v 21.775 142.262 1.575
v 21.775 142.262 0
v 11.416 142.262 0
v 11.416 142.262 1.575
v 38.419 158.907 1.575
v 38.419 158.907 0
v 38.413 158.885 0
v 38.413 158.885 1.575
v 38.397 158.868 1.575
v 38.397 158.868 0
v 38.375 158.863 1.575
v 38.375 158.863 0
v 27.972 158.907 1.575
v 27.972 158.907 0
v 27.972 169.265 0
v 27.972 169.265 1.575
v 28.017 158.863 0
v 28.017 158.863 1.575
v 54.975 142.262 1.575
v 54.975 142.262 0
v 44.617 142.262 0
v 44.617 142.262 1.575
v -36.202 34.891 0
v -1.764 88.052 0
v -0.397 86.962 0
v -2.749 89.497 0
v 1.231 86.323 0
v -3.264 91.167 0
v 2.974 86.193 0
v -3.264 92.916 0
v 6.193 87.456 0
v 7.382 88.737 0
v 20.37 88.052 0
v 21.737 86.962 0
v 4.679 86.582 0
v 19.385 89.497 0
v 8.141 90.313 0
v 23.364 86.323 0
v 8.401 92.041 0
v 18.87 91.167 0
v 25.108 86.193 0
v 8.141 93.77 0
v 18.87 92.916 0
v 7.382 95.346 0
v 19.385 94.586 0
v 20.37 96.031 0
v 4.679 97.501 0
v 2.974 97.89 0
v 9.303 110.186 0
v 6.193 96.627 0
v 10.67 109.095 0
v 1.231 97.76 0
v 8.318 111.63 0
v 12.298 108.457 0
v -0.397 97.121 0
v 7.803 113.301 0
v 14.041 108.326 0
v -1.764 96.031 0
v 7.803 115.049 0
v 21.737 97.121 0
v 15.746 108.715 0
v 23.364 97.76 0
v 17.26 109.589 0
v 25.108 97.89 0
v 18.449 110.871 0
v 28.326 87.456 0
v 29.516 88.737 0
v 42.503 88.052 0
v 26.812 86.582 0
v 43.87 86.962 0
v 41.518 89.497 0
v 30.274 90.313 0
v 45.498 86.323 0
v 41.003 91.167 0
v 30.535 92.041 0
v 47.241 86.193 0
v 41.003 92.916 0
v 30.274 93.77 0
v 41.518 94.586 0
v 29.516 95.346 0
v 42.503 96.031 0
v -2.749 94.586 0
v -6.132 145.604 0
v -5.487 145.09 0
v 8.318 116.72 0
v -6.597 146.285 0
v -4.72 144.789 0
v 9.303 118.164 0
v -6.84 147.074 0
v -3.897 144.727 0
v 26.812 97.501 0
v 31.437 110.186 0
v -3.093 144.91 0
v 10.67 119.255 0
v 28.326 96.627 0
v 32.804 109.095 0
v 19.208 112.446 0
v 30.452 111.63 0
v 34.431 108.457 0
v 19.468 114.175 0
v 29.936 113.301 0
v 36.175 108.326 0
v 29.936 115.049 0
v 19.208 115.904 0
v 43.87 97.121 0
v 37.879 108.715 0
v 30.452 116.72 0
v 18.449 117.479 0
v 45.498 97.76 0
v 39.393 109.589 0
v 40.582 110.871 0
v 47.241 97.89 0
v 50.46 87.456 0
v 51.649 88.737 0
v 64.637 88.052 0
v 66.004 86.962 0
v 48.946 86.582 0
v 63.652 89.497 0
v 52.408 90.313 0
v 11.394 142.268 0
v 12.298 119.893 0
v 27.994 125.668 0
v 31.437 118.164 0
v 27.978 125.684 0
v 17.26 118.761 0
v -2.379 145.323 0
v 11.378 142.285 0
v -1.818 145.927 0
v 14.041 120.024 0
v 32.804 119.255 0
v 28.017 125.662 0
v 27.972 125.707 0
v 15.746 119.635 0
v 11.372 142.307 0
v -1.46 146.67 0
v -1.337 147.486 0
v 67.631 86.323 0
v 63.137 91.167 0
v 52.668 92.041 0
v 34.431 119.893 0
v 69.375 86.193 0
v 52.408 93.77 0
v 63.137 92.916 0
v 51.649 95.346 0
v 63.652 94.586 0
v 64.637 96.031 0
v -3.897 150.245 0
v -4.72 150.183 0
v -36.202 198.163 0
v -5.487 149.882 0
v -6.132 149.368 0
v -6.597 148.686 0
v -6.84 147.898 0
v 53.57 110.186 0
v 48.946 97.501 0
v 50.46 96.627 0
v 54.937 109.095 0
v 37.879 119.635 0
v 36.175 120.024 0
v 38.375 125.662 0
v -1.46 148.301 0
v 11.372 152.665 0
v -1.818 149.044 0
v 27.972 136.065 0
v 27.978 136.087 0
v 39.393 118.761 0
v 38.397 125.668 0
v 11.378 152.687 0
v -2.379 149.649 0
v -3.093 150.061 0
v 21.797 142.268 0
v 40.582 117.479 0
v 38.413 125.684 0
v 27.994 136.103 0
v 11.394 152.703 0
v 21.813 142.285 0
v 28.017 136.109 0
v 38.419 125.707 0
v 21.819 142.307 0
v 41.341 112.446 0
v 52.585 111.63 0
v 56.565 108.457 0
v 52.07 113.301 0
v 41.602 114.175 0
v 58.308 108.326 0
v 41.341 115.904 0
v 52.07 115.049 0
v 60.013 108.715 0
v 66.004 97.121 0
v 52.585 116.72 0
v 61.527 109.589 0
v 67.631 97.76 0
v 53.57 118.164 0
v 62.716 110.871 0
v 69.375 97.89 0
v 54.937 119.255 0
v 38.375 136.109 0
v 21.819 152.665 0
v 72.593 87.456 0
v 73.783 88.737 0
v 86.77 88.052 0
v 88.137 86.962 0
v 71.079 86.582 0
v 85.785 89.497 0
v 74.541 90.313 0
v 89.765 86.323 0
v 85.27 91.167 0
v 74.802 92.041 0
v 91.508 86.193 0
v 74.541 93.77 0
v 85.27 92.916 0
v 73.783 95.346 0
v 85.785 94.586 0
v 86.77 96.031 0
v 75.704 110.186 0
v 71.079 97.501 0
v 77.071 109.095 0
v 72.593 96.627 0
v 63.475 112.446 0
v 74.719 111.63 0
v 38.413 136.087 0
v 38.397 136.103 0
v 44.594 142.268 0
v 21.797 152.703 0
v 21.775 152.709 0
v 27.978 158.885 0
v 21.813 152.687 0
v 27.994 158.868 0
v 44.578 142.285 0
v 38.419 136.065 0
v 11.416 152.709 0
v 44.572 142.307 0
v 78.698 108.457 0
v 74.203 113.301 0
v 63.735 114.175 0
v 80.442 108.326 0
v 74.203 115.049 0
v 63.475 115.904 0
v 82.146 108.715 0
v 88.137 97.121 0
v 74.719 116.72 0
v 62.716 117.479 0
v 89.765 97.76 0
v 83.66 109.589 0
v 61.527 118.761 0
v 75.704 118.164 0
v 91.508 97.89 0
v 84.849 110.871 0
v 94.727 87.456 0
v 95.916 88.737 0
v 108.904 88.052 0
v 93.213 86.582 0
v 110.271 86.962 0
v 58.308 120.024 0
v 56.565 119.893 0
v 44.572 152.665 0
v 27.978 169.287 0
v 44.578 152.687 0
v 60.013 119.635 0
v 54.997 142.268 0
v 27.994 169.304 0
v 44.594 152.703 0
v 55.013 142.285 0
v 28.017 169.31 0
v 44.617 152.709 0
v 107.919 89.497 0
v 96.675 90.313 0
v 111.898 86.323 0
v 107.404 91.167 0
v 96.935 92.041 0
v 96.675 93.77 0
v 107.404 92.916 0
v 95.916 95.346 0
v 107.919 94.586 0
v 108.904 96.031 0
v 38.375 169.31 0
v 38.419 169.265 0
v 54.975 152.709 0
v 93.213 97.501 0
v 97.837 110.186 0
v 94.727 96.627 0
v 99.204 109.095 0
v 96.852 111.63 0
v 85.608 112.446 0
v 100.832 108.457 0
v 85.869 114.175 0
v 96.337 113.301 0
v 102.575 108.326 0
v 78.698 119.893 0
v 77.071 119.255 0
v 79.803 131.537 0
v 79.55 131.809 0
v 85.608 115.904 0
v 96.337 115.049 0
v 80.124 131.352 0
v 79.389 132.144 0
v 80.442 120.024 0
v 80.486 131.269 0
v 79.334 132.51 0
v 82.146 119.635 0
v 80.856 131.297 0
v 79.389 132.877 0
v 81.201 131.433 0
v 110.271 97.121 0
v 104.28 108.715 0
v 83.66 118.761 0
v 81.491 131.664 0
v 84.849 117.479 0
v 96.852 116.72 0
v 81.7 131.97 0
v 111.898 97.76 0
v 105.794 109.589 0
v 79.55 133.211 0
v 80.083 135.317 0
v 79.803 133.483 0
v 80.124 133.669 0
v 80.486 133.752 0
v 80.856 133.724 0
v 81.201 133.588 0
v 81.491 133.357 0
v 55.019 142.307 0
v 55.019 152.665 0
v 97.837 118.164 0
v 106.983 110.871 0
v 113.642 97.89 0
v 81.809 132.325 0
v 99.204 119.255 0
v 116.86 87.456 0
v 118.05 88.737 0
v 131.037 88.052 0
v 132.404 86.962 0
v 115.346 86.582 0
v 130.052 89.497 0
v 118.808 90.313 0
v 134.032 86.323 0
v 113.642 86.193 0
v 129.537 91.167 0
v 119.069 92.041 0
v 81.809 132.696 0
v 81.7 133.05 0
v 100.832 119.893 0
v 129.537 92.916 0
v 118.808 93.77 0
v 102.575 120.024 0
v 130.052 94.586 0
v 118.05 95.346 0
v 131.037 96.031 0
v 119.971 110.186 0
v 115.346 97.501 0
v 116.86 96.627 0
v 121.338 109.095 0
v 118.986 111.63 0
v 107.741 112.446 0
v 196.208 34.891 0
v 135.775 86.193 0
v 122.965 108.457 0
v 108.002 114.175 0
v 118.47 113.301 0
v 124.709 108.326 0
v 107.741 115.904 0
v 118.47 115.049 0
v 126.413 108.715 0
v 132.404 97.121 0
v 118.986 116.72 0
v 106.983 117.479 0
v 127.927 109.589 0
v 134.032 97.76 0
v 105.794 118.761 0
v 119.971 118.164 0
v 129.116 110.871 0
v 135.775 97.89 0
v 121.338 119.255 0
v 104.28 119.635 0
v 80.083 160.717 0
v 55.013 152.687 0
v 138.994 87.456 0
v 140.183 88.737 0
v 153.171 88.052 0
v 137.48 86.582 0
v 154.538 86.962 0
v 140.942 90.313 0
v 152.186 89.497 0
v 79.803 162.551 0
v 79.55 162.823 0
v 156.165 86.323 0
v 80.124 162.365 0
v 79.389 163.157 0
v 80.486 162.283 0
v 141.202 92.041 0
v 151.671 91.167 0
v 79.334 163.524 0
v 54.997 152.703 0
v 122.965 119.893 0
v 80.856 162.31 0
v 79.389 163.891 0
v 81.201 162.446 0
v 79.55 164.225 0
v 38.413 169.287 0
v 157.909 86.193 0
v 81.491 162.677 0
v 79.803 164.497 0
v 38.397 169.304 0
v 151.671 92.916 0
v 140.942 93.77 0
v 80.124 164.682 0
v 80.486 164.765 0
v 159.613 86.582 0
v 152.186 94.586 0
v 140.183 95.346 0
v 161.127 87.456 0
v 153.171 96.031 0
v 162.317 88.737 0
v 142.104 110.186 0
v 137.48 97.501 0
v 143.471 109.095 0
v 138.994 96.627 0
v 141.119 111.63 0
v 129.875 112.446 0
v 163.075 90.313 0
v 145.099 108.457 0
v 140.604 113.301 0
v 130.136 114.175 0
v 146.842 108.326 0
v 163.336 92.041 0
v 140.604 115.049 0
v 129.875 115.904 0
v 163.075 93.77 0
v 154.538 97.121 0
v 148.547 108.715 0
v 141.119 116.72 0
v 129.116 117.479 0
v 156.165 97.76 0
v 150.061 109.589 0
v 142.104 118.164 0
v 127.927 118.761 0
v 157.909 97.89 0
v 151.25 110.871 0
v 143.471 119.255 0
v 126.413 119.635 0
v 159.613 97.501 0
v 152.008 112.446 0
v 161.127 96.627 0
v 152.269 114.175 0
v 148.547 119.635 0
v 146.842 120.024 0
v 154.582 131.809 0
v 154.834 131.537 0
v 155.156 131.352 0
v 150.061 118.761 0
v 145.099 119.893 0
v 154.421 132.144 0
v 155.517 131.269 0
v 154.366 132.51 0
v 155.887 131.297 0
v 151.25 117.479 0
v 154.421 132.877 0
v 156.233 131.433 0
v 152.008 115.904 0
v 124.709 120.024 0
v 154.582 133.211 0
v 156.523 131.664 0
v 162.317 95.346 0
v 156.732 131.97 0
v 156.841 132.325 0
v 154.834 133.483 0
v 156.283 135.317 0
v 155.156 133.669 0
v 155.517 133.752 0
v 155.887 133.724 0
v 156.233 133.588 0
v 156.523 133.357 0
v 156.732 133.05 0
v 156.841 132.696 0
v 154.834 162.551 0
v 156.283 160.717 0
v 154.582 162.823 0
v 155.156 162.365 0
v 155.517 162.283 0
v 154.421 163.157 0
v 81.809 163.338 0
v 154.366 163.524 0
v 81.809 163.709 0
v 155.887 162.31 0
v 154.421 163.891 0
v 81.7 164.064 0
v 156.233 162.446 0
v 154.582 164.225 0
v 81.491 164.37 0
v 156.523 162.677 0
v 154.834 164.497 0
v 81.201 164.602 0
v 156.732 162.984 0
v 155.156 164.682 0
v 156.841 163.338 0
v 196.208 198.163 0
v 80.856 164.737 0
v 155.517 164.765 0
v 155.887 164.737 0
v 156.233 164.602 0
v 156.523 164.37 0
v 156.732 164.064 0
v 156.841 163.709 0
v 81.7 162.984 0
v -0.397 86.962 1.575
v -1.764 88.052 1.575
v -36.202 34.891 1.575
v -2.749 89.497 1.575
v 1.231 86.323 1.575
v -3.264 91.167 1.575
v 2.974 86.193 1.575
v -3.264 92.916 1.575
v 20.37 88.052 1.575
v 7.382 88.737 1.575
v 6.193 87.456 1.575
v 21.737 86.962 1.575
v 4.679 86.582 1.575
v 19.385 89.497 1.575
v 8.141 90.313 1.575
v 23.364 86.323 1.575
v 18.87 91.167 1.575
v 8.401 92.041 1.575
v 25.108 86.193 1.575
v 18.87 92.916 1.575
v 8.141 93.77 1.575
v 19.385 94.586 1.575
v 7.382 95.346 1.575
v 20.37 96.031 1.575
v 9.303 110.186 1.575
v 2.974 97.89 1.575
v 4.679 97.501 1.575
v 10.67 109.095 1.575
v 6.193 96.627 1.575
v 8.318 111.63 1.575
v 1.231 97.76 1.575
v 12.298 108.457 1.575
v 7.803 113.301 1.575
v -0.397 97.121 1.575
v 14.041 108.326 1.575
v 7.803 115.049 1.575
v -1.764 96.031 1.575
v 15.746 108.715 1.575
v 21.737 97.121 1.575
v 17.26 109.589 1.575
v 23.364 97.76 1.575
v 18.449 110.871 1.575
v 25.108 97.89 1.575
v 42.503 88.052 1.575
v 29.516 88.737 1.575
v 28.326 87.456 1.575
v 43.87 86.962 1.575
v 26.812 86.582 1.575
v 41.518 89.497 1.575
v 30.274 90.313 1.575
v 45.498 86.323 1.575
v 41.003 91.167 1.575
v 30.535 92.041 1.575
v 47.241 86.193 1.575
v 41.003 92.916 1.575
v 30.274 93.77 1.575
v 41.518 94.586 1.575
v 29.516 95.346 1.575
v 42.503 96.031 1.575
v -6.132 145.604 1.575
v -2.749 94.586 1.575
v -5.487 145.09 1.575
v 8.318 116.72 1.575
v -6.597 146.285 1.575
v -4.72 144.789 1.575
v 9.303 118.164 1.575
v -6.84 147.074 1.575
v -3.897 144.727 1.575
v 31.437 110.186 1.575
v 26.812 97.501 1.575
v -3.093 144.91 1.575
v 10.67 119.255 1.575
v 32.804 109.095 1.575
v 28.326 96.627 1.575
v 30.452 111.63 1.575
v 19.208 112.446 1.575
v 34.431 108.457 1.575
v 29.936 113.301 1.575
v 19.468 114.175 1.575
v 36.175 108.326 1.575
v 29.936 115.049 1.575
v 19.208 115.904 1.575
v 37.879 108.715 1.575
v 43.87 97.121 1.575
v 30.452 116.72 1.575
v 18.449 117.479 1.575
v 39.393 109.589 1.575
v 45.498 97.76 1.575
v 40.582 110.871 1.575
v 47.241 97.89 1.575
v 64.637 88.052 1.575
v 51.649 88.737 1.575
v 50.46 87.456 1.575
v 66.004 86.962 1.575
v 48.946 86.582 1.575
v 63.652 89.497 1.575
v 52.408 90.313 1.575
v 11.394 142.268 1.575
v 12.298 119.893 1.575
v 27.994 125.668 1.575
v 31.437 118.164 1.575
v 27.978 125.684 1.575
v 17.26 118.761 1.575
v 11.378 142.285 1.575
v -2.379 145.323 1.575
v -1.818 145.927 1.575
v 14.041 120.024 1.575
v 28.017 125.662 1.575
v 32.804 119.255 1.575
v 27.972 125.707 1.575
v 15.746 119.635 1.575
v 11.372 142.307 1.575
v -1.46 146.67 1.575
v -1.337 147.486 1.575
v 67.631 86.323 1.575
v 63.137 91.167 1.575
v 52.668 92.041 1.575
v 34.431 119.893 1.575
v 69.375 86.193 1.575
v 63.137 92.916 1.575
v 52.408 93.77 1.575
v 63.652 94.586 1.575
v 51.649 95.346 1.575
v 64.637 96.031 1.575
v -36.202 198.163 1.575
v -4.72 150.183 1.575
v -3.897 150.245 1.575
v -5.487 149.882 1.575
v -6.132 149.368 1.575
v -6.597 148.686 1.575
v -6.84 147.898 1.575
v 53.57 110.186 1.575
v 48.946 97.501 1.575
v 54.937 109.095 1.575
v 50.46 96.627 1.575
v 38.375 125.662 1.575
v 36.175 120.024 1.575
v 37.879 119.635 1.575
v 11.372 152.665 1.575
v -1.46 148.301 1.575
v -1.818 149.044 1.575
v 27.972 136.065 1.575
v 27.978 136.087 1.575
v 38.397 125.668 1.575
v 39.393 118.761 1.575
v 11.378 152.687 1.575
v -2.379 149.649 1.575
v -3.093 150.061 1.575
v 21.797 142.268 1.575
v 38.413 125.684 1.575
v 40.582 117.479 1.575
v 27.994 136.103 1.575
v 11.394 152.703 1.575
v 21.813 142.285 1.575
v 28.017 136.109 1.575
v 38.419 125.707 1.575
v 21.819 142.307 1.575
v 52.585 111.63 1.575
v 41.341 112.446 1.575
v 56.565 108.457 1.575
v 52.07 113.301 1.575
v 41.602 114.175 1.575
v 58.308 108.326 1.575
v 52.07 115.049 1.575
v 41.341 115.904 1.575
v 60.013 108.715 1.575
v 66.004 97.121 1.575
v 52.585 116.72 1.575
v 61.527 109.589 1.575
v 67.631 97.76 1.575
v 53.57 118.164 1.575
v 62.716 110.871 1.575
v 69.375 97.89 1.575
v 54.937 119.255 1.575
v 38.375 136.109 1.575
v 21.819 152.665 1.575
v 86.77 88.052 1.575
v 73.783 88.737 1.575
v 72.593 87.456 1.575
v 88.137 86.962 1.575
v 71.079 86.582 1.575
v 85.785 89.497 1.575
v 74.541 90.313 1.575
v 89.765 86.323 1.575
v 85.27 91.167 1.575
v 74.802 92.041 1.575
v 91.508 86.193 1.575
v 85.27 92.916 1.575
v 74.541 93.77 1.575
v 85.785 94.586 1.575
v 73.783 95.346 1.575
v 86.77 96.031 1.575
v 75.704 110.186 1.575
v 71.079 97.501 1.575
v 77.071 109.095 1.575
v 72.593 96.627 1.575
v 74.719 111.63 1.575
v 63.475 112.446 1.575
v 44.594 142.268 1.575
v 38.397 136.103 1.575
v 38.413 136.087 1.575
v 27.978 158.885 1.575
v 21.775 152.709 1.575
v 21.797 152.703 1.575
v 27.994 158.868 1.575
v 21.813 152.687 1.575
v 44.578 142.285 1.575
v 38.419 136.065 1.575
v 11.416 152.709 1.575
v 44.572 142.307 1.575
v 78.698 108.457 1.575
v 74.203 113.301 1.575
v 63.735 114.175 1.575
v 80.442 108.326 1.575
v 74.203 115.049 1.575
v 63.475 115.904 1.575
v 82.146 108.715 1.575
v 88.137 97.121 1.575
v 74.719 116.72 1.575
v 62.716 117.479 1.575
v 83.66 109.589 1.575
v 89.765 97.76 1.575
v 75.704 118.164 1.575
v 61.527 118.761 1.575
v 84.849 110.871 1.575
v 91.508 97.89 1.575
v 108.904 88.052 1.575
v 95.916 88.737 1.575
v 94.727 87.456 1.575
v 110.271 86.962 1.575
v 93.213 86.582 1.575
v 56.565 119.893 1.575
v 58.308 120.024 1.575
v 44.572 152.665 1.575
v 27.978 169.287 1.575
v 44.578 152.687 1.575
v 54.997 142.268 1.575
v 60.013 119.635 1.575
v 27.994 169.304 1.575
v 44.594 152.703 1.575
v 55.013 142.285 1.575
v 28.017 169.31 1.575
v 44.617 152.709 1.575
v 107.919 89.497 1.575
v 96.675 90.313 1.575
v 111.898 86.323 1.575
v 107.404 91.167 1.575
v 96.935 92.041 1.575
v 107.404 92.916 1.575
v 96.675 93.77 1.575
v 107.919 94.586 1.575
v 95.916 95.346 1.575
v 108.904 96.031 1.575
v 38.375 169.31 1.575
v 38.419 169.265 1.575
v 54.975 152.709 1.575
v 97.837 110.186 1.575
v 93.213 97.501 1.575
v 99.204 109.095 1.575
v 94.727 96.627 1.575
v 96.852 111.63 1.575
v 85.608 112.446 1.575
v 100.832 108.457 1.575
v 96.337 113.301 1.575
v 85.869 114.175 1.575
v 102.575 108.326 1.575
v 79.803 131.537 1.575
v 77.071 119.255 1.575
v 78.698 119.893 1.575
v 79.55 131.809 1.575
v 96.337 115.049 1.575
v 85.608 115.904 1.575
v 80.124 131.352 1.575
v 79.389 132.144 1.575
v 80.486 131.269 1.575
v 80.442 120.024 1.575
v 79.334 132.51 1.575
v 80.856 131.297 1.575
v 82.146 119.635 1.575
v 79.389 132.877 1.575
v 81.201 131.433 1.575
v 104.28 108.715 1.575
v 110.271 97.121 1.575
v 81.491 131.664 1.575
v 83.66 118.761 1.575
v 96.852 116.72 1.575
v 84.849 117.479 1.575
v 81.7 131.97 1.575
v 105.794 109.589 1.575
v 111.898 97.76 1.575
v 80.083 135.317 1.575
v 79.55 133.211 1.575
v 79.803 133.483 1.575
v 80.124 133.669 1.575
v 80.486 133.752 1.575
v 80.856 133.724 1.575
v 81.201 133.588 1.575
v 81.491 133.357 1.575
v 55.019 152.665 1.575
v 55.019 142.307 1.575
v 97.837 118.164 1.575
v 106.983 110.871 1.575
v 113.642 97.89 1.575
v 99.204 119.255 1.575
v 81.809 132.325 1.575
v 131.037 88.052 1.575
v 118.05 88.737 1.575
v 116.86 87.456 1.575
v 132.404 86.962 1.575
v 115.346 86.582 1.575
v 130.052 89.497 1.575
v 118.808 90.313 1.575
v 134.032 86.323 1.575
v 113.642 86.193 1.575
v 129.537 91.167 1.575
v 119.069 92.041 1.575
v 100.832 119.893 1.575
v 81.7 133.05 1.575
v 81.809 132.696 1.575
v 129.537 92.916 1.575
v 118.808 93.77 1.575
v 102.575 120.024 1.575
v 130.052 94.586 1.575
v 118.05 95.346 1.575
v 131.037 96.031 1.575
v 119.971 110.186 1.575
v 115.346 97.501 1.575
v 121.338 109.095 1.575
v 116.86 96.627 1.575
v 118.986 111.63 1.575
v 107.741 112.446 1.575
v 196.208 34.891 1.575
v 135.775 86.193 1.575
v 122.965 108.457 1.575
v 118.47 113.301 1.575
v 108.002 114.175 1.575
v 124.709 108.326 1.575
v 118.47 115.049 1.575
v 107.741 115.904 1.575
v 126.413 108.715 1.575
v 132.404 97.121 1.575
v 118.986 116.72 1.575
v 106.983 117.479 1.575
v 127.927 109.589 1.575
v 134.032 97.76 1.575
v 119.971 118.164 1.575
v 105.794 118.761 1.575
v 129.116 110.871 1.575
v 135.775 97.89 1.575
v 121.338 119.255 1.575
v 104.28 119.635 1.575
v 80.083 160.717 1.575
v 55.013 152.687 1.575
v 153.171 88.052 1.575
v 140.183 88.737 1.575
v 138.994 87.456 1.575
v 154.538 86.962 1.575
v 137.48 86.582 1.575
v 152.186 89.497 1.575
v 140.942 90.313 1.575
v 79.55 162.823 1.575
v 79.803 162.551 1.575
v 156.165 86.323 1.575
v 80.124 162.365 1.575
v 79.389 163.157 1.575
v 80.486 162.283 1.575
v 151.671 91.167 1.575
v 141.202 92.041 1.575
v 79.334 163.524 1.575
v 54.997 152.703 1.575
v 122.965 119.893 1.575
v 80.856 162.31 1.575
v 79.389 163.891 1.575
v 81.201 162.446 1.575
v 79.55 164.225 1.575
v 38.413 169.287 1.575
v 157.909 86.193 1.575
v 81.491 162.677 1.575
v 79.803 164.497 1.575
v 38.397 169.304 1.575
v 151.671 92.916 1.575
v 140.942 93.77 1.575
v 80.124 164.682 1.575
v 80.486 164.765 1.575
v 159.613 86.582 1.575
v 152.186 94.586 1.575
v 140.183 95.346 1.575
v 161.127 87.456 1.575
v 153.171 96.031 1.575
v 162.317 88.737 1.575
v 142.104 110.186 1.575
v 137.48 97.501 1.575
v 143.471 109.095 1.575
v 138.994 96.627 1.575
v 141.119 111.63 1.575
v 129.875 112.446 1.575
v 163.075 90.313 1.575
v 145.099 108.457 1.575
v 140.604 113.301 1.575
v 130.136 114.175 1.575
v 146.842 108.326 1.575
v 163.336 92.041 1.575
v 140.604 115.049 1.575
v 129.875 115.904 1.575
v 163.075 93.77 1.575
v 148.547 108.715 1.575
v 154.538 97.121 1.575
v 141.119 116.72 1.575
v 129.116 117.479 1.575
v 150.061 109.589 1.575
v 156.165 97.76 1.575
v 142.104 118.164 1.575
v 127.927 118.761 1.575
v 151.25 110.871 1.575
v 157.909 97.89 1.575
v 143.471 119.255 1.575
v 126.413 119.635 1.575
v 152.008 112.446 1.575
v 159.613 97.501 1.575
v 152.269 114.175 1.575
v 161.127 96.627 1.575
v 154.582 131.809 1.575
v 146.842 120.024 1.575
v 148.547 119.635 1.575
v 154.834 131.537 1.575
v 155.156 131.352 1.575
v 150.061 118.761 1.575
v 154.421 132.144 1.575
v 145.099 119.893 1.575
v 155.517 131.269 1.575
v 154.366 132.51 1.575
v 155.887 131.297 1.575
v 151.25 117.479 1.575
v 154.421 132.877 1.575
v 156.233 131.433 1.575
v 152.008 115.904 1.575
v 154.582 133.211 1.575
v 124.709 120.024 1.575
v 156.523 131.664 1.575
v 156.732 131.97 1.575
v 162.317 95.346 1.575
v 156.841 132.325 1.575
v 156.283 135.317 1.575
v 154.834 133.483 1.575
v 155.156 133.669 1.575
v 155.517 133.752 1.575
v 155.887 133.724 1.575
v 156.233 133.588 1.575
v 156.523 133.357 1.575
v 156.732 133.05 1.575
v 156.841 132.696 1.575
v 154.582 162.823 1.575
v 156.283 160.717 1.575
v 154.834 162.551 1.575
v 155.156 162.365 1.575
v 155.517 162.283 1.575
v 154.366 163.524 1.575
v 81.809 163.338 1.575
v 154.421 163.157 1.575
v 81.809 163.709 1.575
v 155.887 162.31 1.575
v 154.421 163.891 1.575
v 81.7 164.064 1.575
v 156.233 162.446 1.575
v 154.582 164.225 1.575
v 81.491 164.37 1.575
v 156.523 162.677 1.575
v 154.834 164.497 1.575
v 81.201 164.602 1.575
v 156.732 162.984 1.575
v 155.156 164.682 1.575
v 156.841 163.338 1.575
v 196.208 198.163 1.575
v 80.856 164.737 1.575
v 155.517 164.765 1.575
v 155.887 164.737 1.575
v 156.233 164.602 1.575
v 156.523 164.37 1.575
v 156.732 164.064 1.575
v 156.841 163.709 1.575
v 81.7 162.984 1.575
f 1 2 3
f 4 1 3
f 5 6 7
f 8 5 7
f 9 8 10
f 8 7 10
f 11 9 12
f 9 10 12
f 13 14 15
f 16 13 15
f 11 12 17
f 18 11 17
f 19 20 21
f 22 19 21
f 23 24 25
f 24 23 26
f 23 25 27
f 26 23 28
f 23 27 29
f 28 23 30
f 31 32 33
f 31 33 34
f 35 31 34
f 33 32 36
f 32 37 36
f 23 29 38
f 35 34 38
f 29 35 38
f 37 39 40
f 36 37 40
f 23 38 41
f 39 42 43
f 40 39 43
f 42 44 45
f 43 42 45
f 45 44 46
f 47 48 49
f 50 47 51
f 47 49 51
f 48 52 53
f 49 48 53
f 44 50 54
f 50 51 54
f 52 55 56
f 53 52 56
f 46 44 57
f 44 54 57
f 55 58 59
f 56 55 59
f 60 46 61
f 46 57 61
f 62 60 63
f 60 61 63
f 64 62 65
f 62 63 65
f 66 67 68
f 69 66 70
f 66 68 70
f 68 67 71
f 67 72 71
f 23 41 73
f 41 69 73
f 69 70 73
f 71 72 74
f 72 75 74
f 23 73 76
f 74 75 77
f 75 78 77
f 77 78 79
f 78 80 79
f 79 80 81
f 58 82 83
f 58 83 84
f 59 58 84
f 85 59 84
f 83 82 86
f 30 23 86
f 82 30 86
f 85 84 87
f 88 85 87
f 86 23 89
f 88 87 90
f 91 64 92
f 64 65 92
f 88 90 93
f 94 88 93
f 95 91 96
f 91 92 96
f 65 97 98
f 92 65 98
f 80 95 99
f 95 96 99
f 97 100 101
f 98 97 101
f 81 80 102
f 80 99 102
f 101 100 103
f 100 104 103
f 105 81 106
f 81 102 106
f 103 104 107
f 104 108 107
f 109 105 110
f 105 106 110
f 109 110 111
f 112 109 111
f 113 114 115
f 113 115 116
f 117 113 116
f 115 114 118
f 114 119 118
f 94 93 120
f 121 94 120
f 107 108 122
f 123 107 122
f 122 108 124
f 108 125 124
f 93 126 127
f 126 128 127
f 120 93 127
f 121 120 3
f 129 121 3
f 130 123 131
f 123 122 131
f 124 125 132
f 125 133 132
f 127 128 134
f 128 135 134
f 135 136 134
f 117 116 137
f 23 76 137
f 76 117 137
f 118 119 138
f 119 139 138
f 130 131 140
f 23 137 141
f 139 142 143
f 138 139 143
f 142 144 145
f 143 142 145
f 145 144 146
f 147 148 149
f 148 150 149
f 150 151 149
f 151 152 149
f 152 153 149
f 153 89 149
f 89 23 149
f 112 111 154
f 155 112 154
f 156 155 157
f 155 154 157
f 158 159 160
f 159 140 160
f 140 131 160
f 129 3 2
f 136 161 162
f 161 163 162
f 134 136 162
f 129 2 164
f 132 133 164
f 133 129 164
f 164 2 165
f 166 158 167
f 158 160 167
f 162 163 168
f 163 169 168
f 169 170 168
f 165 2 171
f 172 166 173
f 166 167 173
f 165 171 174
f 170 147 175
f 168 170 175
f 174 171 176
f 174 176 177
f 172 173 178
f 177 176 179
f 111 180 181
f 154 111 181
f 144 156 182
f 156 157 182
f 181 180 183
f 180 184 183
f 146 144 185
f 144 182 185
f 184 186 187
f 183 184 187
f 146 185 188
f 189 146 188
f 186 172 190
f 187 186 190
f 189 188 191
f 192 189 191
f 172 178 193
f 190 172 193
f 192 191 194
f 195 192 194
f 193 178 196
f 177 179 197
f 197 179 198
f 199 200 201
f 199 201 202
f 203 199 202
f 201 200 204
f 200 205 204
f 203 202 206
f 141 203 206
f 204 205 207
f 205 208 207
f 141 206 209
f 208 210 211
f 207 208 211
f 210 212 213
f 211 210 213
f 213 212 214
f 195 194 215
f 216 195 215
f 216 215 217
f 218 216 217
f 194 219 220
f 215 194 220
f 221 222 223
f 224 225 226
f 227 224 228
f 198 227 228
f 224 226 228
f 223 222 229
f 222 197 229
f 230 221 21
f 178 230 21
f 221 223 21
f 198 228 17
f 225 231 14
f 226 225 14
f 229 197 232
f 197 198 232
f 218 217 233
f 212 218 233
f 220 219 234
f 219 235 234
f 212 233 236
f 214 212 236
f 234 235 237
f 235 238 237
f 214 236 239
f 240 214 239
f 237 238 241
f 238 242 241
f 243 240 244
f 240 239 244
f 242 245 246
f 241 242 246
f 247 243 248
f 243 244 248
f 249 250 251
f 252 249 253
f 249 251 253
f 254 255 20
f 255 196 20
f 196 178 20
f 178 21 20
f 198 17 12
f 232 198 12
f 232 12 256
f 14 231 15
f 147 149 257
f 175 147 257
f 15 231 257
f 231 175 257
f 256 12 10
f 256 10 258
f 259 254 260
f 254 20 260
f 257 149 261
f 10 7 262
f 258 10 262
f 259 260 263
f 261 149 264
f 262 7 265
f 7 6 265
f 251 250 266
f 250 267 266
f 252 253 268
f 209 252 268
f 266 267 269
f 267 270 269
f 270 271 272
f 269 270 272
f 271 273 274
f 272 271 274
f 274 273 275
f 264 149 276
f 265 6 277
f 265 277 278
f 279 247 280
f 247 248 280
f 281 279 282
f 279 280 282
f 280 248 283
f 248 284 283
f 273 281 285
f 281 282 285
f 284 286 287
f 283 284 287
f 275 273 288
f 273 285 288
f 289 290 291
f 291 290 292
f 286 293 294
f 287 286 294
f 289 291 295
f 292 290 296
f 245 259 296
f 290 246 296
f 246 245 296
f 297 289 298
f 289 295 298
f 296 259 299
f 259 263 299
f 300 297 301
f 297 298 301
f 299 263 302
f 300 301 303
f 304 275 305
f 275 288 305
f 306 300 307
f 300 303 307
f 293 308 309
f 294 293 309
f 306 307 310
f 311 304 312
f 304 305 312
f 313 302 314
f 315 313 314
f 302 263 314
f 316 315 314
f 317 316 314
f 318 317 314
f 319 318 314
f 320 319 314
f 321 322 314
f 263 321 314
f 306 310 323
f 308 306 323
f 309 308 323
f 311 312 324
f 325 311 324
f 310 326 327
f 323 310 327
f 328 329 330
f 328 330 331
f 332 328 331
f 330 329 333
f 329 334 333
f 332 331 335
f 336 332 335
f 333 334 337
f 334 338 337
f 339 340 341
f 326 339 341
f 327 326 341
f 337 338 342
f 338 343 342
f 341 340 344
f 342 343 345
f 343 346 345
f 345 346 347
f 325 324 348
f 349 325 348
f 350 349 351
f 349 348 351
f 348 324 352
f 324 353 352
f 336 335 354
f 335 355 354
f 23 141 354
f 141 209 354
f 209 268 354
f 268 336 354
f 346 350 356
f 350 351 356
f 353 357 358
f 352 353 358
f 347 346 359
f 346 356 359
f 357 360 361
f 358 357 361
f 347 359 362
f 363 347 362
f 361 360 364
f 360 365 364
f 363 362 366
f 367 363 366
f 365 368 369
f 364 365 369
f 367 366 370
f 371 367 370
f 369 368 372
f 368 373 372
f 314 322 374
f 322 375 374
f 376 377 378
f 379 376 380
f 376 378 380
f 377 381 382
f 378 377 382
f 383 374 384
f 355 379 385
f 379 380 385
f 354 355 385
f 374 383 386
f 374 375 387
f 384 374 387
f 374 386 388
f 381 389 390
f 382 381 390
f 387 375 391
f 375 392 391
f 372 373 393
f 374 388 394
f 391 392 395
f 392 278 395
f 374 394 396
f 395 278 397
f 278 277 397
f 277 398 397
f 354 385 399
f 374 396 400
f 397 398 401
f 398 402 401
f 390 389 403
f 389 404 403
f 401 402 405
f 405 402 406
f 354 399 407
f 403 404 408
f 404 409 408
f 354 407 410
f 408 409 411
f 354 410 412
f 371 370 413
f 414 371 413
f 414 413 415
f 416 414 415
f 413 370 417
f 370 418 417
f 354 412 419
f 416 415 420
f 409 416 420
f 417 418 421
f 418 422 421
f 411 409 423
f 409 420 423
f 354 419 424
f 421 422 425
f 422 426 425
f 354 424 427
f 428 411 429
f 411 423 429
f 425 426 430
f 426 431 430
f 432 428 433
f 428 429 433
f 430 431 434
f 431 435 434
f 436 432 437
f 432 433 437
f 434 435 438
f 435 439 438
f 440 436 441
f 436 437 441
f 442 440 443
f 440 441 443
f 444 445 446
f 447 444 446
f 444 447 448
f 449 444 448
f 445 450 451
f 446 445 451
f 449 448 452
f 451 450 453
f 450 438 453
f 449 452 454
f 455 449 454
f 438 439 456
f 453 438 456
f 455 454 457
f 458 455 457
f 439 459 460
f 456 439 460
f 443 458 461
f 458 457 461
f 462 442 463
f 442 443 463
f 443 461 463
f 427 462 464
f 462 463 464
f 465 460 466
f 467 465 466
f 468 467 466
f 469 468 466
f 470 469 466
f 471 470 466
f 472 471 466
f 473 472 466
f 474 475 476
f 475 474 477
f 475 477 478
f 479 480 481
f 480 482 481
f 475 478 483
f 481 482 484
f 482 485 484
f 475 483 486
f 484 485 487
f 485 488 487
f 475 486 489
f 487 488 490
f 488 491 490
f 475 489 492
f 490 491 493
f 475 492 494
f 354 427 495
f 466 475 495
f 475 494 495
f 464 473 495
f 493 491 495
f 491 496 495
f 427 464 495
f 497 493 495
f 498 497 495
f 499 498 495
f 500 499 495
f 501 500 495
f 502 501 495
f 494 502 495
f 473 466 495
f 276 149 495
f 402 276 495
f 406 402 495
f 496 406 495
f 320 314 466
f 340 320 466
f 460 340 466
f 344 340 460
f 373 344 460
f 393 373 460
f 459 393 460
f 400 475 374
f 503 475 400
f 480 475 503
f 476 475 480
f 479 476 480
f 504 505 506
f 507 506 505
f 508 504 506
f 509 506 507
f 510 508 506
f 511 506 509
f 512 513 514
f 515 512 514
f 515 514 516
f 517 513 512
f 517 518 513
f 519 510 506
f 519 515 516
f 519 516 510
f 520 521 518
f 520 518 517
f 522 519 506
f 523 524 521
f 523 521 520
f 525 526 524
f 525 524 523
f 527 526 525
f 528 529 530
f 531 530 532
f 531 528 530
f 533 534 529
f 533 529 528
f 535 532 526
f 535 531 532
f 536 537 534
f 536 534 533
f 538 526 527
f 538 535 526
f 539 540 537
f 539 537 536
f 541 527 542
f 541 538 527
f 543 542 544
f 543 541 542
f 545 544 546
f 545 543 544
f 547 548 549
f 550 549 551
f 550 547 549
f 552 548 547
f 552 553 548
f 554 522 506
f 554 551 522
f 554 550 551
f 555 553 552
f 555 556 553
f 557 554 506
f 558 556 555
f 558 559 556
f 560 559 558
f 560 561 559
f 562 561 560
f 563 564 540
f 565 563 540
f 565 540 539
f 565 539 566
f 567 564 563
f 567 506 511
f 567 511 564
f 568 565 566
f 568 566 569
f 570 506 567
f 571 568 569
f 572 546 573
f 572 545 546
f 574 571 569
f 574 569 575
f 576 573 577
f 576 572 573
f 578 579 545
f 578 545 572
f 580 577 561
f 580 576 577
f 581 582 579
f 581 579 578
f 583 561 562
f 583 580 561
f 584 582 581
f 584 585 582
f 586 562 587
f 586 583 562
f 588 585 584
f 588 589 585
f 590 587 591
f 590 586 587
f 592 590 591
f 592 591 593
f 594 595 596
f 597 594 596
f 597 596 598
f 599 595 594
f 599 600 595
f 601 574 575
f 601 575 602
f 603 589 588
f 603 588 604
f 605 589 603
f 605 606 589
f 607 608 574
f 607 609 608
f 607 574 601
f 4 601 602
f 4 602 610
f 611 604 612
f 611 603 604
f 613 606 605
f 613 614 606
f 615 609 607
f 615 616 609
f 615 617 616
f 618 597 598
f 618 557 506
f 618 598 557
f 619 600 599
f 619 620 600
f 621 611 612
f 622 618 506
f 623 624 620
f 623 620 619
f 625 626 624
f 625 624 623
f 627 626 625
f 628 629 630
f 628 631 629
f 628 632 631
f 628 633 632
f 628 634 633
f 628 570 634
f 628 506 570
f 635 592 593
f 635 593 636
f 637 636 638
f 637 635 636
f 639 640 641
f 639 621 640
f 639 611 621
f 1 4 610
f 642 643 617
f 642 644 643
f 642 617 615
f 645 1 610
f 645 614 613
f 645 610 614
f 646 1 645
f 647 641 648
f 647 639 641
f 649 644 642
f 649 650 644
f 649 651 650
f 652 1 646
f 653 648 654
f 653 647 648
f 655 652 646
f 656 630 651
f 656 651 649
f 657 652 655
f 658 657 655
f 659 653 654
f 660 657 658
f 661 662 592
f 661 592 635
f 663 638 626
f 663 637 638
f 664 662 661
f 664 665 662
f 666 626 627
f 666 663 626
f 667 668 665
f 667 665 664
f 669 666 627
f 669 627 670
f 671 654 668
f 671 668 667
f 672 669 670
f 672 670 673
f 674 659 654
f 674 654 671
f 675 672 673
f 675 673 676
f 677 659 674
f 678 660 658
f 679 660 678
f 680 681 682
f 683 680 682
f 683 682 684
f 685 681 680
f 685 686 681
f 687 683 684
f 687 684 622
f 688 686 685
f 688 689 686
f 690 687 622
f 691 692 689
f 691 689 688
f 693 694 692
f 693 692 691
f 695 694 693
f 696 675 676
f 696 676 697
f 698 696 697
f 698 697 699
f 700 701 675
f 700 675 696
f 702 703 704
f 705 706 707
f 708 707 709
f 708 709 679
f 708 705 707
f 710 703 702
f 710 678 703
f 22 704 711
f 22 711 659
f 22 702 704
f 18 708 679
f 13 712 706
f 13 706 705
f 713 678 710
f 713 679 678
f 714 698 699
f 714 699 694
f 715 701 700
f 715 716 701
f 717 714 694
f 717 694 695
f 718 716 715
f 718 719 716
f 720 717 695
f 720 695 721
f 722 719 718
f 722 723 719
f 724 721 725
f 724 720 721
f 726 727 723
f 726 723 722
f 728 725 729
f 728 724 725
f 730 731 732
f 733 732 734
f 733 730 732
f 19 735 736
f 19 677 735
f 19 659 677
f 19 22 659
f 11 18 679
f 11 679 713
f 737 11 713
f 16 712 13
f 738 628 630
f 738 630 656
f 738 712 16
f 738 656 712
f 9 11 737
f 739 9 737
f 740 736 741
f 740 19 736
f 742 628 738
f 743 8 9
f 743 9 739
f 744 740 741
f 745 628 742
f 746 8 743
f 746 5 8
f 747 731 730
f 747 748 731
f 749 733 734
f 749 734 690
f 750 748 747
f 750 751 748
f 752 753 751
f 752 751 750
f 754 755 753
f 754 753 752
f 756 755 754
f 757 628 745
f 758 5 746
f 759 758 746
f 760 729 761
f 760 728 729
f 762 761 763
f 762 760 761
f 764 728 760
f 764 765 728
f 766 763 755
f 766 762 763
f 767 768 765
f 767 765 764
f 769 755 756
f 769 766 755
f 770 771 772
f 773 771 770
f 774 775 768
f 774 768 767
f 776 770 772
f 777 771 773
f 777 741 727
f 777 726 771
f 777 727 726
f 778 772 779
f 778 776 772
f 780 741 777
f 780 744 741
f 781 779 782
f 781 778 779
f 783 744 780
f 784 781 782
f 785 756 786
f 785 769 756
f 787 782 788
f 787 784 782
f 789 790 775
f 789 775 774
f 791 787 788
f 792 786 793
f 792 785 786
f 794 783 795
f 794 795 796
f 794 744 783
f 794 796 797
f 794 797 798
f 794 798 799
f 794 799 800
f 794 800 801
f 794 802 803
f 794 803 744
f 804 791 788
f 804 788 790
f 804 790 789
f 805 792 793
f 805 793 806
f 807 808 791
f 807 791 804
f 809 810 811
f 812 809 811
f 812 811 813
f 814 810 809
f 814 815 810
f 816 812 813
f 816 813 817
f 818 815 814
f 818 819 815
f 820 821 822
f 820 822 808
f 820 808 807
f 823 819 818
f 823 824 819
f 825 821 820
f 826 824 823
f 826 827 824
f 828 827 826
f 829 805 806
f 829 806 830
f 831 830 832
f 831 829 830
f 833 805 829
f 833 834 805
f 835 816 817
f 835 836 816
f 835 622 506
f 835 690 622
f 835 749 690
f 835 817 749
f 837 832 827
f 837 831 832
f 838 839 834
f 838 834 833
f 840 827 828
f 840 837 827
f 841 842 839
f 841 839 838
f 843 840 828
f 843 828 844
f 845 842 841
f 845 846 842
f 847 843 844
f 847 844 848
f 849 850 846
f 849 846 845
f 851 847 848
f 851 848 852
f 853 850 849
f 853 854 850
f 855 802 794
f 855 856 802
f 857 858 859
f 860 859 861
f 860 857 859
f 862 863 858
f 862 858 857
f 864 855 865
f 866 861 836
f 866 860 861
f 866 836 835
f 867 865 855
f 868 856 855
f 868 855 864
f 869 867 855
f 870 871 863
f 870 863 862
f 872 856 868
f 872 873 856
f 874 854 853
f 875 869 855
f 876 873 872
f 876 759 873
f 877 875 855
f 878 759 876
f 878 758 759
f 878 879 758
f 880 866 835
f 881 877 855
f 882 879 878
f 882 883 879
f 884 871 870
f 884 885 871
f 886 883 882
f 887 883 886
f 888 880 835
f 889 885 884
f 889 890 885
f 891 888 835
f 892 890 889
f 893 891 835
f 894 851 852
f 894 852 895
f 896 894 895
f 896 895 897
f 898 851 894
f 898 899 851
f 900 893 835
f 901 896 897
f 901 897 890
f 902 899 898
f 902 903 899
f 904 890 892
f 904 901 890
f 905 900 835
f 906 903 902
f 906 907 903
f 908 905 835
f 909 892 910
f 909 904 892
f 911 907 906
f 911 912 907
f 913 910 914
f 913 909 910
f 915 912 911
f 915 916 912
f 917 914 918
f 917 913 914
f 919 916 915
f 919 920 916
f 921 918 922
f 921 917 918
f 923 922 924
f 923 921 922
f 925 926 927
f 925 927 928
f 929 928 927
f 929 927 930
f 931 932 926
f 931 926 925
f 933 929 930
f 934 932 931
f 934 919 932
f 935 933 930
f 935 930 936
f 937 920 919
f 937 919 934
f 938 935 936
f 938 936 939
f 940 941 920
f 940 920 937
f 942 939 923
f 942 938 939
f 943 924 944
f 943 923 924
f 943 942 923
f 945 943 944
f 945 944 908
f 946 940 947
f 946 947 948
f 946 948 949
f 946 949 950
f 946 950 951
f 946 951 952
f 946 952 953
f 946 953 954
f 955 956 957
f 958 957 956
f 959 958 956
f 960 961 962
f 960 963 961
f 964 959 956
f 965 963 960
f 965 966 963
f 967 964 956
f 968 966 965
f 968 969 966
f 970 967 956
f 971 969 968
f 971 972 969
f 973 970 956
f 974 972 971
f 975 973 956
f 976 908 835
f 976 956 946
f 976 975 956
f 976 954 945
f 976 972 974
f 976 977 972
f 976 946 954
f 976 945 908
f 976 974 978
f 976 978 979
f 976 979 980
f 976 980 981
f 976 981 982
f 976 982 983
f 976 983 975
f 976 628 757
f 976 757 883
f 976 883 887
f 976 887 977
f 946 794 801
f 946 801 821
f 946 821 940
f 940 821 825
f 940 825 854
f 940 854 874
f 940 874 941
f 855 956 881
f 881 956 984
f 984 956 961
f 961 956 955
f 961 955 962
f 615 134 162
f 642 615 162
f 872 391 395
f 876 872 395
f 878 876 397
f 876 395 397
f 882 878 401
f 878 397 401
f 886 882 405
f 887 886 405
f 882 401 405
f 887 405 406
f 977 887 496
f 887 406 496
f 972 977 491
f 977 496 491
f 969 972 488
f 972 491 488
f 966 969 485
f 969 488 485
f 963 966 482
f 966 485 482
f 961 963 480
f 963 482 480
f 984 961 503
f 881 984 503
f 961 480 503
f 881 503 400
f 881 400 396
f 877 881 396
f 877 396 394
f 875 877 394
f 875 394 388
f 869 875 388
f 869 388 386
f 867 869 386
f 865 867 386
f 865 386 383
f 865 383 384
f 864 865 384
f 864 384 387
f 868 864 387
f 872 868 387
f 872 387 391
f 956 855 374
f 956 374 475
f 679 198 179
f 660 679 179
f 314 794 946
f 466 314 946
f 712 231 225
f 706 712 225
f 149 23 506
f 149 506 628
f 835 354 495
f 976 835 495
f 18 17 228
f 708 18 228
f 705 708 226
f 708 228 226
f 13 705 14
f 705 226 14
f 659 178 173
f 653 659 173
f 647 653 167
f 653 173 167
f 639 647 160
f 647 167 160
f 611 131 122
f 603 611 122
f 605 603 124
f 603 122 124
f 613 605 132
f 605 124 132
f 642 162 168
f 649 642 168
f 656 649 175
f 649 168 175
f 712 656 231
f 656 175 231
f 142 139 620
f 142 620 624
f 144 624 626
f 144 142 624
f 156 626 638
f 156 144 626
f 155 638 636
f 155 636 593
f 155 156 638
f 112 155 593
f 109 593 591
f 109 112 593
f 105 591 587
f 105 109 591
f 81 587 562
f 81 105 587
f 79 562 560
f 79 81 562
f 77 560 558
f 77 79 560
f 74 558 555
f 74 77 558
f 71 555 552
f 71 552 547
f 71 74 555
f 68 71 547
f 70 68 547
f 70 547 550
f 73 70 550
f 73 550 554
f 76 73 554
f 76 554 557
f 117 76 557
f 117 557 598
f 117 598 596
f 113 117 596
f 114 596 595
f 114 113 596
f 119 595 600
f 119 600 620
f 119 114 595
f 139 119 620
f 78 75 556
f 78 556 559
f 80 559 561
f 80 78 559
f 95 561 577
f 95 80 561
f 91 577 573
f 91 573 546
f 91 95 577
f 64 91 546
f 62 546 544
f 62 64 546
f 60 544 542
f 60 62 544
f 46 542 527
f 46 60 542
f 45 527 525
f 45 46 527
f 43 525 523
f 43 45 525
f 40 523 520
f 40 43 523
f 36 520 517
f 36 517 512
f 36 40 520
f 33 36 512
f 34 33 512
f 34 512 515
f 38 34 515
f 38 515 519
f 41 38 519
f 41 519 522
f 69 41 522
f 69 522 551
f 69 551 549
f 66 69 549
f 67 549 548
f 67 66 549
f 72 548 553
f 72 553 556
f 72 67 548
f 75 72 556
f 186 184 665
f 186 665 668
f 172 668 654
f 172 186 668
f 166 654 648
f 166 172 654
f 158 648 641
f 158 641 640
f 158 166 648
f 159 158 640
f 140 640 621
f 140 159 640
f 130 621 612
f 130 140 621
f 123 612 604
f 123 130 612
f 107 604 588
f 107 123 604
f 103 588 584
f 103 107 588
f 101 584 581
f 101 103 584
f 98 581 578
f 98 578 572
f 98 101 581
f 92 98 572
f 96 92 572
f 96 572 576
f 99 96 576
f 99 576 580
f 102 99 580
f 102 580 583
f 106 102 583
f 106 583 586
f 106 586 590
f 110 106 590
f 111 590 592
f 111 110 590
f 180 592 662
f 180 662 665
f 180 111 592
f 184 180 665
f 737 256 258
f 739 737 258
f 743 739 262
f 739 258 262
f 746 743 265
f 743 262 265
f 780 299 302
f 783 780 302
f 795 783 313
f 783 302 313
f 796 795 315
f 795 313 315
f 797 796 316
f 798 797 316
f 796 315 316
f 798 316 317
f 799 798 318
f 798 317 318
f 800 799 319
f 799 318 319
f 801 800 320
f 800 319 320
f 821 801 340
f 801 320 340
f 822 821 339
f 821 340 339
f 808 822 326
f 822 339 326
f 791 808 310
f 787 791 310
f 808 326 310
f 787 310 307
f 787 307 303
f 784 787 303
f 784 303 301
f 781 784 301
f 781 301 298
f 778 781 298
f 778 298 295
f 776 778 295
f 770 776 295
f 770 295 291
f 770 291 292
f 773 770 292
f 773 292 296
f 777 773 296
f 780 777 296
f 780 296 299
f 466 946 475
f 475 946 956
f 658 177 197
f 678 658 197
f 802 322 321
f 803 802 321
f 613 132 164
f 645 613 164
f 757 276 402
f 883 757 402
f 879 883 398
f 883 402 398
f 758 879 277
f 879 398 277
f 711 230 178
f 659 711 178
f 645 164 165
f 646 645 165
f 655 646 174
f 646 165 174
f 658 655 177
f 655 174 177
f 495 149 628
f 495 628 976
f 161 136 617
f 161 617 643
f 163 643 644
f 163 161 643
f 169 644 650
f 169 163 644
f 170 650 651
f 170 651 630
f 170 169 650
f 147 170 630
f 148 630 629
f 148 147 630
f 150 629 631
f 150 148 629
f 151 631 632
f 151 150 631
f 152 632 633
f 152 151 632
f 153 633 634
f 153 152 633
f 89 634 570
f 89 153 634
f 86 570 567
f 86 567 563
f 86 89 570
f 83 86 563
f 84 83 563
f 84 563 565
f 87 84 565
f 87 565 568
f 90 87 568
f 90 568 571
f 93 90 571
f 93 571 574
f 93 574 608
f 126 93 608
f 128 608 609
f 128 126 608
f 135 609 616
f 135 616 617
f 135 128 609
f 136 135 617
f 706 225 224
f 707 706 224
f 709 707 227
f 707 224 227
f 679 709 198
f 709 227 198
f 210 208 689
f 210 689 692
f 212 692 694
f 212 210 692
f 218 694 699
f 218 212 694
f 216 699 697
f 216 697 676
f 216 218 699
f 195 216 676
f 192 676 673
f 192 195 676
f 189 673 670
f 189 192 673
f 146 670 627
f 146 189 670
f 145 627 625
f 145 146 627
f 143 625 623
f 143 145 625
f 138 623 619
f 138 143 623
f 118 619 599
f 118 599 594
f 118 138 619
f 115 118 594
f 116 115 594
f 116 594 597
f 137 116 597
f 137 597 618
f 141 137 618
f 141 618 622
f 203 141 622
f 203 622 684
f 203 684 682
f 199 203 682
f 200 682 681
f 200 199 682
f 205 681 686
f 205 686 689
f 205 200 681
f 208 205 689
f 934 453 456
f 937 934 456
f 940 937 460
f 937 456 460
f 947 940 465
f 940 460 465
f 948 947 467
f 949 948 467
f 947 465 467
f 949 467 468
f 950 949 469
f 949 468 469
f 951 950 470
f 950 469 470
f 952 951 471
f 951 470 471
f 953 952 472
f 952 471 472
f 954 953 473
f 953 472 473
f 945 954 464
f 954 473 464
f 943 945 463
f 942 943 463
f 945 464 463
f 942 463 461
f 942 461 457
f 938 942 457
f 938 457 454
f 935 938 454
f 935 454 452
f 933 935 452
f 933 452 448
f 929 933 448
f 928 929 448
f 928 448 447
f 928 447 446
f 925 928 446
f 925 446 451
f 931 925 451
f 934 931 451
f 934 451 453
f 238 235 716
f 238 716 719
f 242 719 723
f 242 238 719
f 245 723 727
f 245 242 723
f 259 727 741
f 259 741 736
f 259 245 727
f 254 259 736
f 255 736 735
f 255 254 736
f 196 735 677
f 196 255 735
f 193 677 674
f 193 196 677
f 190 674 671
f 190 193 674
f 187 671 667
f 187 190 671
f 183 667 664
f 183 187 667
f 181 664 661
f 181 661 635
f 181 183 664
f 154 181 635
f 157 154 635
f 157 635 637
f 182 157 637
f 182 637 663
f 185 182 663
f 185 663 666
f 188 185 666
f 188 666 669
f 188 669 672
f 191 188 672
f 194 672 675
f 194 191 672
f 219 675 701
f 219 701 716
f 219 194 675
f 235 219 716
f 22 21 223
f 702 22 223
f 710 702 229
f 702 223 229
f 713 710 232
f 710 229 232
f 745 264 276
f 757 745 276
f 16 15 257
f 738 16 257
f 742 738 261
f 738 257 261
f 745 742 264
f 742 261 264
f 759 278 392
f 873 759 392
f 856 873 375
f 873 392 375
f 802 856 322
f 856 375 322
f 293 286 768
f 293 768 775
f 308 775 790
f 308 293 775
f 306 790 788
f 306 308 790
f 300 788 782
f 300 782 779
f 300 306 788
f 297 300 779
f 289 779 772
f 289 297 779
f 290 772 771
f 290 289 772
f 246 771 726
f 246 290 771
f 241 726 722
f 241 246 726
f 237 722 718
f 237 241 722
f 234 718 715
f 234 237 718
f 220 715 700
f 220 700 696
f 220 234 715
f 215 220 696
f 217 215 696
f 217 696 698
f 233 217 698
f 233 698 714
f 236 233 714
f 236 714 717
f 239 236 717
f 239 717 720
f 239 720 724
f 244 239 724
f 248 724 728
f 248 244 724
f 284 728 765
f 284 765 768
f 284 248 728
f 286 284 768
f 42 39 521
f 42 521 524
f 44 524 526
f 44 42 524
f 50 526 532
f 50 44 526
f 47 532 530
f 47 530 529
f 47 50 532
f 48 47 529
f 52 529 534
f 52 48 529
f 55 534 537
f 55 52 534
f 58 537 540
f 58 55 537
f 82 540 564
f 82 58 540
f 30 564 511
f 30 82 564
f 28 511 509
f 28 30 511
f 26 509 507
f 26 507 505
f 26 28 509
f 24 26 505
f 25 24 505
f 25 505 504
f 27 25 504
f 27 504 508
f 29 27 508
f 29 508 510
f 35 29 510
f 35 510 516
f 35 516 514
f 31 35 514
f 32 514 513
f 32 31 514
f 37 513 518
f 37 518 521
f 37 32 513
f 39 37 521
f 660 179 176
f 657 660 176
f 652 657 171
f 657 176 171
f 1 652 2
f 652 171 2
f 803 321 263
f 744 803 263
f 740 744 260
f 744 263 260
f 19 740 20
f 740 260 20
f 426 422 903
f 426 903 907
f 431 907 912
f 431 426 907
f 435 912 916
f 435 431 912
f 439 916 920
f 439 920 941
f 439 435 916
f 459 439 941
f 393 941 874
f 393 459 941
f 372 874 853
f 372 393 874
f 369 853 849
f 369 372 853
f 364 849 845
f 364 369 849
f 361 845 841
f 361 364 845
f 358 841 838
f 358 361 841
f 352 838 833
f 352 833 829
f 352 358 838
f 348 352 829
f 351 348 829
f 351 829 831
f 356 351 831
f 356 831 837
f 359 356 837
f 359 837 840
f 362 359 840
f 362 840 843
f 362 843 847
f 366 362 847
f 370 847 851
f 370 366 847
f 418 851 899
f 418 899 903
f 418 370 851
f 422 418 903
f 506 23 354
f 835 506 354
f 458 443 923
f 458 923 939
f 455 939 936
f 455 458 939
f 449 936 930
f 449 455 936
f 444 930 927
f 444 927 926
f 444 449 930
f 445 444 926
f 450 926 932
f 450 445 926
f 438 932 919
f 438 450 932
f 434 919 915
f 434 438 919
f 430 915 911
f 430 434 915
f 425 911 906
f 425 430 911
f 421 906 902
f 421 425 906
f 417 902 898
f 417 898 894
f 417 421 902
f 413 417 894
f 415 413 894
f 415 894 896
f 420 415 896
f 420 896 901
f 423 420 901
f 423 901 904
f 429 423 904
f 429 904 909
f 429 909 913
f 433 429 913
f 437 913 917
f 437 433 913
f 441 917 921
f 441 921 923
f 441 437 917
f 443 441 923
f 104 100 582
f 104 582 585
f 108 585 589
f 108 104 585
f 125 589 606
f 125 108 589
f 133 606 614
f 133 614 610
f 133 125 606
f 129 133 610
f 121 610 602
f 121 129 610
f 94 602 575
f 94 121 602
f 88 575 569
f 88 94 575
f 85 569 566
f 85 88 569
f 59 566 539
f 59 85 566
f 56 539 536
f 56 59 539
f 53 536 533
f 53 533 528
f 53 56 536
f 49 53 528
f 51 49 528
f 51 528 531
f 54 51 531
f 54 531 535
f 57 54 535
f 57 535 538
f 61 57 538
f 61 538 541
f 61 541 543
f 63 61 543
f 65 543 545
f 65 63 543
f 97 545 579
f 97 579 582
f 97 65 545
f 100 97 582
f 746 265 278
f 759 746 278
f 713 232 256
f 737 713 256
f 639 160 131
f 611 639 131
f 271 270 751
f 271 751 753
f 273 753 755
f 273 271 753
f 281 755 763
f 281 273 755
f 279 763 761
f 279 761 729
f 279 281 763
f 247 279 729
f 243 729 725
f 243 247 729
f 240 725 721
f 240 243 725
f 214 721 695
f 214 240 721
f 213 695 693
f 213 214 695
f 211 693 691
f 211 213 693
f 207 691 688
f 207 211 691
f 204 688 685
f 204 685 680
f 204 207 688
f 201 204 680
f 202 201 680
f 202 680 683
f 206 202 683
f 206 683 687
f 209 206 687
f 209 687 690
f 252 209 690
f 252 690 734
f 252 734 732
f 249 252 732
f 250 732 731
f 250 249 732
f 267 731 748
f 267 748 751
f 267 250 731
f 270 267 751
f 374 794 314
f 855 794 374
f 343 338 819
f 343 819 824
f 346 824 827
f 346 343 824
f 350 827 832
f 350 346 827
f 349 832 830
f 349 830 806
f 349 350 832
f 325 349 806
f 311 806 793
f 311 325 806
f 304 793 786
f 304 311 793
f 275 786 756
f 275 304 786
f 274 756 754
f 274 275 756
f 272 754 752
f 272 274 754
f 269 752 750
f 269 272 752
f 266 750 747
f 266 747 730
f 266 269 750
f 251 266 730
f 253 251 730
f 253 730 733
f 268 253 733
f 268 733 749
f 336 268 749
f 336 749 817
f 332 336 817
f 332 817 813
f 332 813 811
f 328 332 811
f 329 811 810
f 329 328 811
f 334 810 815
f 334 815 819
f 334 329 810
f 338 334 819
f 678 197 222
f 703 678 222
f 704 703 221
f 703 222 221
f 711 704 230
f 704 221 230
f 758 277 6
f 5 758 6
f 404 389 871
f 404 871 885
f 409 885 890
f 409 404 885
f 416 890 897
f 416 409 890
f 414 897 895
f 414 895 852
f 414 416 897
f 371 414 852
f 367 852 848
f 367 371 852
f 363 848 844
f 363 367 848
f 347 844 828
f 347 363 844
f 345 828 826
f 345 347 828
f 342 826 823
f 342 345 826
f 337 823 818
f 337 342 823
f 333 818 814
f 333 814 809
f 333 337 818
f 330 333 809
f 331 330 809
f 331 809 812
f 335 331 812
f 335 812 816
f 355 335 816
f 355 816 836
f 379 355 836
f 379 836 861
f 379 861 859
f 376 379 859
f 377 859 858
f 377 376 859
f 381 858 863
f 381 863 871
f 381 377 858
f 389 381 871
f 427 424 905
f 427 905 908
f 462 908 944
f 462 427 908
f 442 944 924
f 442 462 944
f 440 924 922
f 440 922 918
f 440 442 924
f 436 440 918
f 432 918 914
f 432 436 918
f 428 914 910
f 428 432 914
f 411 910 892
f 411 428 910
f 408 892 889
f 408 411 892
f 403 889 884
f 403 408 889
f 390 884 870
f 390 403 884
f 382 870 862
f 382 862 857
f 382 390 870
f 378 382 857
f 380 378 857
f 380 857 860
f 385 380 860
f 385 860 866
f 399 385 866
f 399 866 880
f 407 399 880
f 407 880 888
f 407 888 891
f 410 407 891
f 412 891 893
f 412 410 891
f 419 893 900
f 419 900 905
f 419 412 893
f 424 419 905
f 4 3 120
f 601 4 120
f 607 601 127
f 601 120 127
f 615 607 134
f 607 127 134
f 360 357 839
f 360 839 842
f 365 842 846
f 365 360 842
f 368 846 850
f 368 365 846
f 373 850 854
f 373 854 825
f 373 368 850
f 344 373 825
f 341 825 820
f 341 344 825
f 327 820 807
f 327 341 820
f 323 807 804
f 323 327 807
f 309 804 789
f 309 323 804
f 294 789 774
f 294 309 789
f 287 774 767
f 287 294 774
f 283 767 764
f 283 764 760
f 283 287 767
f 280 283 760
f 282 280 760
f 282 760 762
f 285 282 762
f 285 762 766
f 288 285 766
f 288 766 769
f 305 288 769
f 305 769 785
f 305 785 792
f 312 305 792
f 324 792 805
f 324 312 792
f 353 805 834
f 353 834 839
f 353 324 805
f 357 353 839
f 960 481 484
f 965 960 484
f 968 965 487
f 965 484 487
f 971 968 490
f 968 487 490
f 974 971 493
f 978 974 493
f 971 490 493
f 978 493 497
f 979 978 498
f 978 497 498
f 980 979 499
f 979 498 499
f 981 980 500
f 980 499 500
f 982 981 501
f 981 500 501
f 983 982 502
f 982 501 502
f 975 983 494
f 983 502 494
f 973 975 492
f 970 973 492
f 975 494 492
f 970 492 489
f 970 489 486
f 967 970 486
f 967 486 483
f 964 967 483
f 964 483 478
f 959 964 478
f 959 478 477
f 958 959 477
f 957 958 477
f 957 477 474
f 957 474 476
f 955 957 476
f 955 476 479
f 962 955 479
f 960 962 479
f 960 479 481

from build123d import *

# Parameters (mm, degrees)
MODEL_W             = 232.41
MODEL_H             = 163.2712
MODEL_R             = 2.766686572
MODEL_R_2           = 5.865375533
BOSS_EXTRUDE2_DEPTH = 1.5748
SKETCH10_W          = 76.2
SKETCH10_H          = 25.4
CUT_EXTRUDE13_DEPTH = 1.5748
SKETCH11_R          = 1.2446
CUT_EXTRUDE14_DEPTH = 279.870205617


with BuildPart() as part:
    # Model → Boss-Extrude2 (new body)
    with BuildSketch(Plane.XY):
        with Locations((80.00320848, 116.527086979)):
            Rectangle(MODEL_W, MODEL_H)
        with Locations((-4.104063311, 147.485885883)):
            Circle(MODEL_R, mode=Mode.SUBTRACT)
        with Locations((68.936462192, 92.041486979)):
            Circle(MODEL_R_2, mode=Mode.SUBTRACT)
        with Locations((2.535984462, 92.041486979)):
            Circle(MODEL_R_2, mode=Mode.SUBTRACT)
        with Locations((24.669477039, 92.041486979)):
            Circle(MODEL_R_2, mode=Mode.SUBTRACT)
        with Locations((46.802969616, 92.041486979)):
            Circle(MODEL_R_2, mode=Mode.SUBTRACT)
        with Locations((91.069954769, 92.041486979)):
            Circle(MODEL_R_2, mode=Mode.SUBTRACT)
        with Locations((113.203447345, 92.041486979)):
            Circle(MODEL_R_2, mode=Mode.SUBTRACT)
        with Locations((135.336939922, 92.041486979)):
            Circle(MODEL_R_2, mode=Mode.SUBTRACT)
        with Locations((157.470432499, 92.041486979)):
            Circle(MODEL_R_2, mode=Mode.SUBTRACT)
        with Locations((146.40368621, 114.174979556)):
            Circle(MODEL_R_2, mode=Mode.SUBTRACT)
        with Locations((124.270193634, 114.174979556)):
            Circle(MODEL_R_2, mode=Mode.SUBTRACT)
        with Locations((102.136701057, 114.174979556)):
            Circle(MODEL_R_2, mode=Mode.SUBTRACT)
        with Locations((80.00320848, 114.174979556)):
            Circle(MODEL_R_2, mode=Mode.SUBTRACT)
        with Locations((57.869715904, 114.174979556)):
            Circle(MODEL_R_2, mode=Mode.SUBTRACT)
        with Locations((35.736223327, 114.174979556)):
            Circle(MODEL_R_2, mode=Mode.SUBTRACT)
        with Locations((13.602730751, 114.174979556)):
            Circle(MODEL_R_2, mode=Mode.SUBTRACT)
        with BuildLine():
            Line((28.016503786, 169.309509564), (38.374978312, 169.309509564))
            ThreePointArc((38.374978312, 169.309509564), (38.406279807, 169.296544074), (38.419245297, 169.265242579))
            Line((38.419245297, 169.265242579), (38.419245297, 158.906768053))
            ThreePointArc((38.419245297, 158.906768053), (38.406279807, 158.875466558), (38.374978312, 158.862501068))
            Line((38.374978312, 158.862501068), (28.016503786, 158.862501068))
            ThreePointArc((28.016503786, 158.862501068), (27.985202291, 158.875466558), (27.972236801, 158.906768053))
            Line((27.972236801, 158.906768053), (27.972236801, 169.265242579))
            ThreePointArc((27.972236801, 169.265242579), (27.985202291, 169.296544074), (28.016503786, 169.309509564))
        make_face(mode=Mode.SUBTRACT)
        with BuildLine():
            Line((28.016503786, 136.109270699), (38.374978312, 136.109270699))
            ThreePointArc((38.374978312, 136.109270699), (38.406279807, 136.096305209), (38.419245297, 136.065003714))
            Line((38.419245297, 136.065003714), (38.419245297, 125.706529188))
            ThreePointArc((38.419245297, 125.706529188), (38.406279807, 125.675227693), (38.374978312, 125.662262203))
            Line((38.374978312, 125.662262203), (28.016503786, 125.662262203))
            ThreePointArc((28.016503786, 125.662262203), (27.985202291, 125.675227693), (27.972236801, 125.706529188))
            Line((27.972236801, 125.706529188), (27.972236801, 136.065003714))
            ThreePointArc((27.972236801, 136.065003714), (27.985202291, 136.096305209), (28.016503786, 136.109270699))
        make_face(mode=Mode.SUBTRACT)
        with BuildLine():
            Line((44.616623219, 152.709390132), (54.975097745, 152.709390132))
            ThreePointArc((54.975097745, 152.709390132), (55.00639924, 152.696424641), (55.01936473, 152.665123146))
            Line((55.01936473, 152.665123146), (55.01936473, 142.306648621))
            ThreePointArc((55.01936473, 142.306648621), (55.00639924, 142.275347125), (54.975097745, 142.262381635))
            Line((54.975097745, 142.262381635), (44.616623219, 142.262381635))
            ThreePointArc((44.616623219, 142.262381635), (44.585321724, 142.275347125), (44.572356234, 142.306648621))
            Line((44.572356234, 142.306648621), (44.572356234, 152.665123146))
            ThreePointArc((44.572356234, 152.665123146), (44.585321724, 152.696424641), (44.616623219, 152.709390132))
        make_face(mode=Mode.SUBTRACT)
        with BuildLine():
            Line((21.819125865, 152.665123146), (21.819125865, 142.306648621))
            ThreePointArc((21.819125865, 142.306648621), (21.806160375, 142.275347125), (21.77485888, 142.262381635))
            Line((21.77485888, 142.262381635), (11.416384354, 142.262381635))
            ThreePointArc((11.416384354, 142.262381635), (11.385082859, 142.275347125), (11.372117369, 142.306648621))
            Line((11.372117369, 142.306648621), (11.372117369, 152.665123146))
            ThreePointArc((11.372117369, 152.665123146), (11.385082859, 152.696424641), (11.416384354, 152.709390132))
            Line((11.416384354, 152.709390132), (21.77485888, 152.709390132))
            ThreePointArc((21.77485888, 152.709390132), (21.806160375, 152.696424641), (21.819125865, 152.665123146))
        make_face(mode=Mode.SUBTRACT)
        with BuildLine():
            Line((146.071683822, 154.070599925), (146.071683822, 141.963579486))
            ThreePointArc((146.071683822, 141.963579486), (146.058718332, 141.93227799), (146.027416836, 141.9193125))
            Line((146.027416836, 141.9193125), (90.339549514, 141.9193125))
            ThreePointArc((90.339549514, 141.9193125), (90.308248019, 141.93227799), (90.295282529, 141.963579486))
            Line((90.295282529, 141.963579486), (90.295282529, 154.070599925))
            ThreePointArc((90.295282529, 154.070599925), (90.308248019, 154.10190142), (90.339549514, 154.11486691))
            Line((90.339549514, 154.11486691), (146.027416836, 154.11486691))
            ThreePointArc((146.027416836, 154.11486691), (146.058718332, 154.10190142), (146.071683822, 154.070599925))
        make_face(mode=Mode.SUBTRACT)
    extrude(amount=BOSS_EXTRUDE2_DEPTH)

    # Sketch10 → Cut-Extrude13 (cut)
    with BuildSketch(Plane.XY.offset(1.5748)):
        with Locations((118.183483175, 148.017089705)):
            Rectangle(SKETCH10_W, SKETCH10_H)
    extrude(amount=-CUT_EXTRUDE13_DEPTH, mode=Mode.SUBTRACT)

    # Sketch11 → Cut-Extrude14 (cut, through all)
    with BuildSketch(Plane(origin=(0, 0, 0), x_dir=(-1, 0, 0), z_dir=(0, 0, -1))):
        with Locations((-155.610383175, 163.523789705)):
            Circle(SKETCH11_R)
        with Locations((-155.610383175, 132.510389705)):
            Circle(SKETCH11_R)
        with Locations((-80.578783175, 132.510389705)):
            Circle(SKETCH11_R)
        with Locations((-80.578783175, 163.523789705)):
            Circle(SKETCH11_R)
    extrude(amount=-CUT_EXTRUDE14_DEPTH, mode=Mode.SUBTRACT)


solid = part.part
